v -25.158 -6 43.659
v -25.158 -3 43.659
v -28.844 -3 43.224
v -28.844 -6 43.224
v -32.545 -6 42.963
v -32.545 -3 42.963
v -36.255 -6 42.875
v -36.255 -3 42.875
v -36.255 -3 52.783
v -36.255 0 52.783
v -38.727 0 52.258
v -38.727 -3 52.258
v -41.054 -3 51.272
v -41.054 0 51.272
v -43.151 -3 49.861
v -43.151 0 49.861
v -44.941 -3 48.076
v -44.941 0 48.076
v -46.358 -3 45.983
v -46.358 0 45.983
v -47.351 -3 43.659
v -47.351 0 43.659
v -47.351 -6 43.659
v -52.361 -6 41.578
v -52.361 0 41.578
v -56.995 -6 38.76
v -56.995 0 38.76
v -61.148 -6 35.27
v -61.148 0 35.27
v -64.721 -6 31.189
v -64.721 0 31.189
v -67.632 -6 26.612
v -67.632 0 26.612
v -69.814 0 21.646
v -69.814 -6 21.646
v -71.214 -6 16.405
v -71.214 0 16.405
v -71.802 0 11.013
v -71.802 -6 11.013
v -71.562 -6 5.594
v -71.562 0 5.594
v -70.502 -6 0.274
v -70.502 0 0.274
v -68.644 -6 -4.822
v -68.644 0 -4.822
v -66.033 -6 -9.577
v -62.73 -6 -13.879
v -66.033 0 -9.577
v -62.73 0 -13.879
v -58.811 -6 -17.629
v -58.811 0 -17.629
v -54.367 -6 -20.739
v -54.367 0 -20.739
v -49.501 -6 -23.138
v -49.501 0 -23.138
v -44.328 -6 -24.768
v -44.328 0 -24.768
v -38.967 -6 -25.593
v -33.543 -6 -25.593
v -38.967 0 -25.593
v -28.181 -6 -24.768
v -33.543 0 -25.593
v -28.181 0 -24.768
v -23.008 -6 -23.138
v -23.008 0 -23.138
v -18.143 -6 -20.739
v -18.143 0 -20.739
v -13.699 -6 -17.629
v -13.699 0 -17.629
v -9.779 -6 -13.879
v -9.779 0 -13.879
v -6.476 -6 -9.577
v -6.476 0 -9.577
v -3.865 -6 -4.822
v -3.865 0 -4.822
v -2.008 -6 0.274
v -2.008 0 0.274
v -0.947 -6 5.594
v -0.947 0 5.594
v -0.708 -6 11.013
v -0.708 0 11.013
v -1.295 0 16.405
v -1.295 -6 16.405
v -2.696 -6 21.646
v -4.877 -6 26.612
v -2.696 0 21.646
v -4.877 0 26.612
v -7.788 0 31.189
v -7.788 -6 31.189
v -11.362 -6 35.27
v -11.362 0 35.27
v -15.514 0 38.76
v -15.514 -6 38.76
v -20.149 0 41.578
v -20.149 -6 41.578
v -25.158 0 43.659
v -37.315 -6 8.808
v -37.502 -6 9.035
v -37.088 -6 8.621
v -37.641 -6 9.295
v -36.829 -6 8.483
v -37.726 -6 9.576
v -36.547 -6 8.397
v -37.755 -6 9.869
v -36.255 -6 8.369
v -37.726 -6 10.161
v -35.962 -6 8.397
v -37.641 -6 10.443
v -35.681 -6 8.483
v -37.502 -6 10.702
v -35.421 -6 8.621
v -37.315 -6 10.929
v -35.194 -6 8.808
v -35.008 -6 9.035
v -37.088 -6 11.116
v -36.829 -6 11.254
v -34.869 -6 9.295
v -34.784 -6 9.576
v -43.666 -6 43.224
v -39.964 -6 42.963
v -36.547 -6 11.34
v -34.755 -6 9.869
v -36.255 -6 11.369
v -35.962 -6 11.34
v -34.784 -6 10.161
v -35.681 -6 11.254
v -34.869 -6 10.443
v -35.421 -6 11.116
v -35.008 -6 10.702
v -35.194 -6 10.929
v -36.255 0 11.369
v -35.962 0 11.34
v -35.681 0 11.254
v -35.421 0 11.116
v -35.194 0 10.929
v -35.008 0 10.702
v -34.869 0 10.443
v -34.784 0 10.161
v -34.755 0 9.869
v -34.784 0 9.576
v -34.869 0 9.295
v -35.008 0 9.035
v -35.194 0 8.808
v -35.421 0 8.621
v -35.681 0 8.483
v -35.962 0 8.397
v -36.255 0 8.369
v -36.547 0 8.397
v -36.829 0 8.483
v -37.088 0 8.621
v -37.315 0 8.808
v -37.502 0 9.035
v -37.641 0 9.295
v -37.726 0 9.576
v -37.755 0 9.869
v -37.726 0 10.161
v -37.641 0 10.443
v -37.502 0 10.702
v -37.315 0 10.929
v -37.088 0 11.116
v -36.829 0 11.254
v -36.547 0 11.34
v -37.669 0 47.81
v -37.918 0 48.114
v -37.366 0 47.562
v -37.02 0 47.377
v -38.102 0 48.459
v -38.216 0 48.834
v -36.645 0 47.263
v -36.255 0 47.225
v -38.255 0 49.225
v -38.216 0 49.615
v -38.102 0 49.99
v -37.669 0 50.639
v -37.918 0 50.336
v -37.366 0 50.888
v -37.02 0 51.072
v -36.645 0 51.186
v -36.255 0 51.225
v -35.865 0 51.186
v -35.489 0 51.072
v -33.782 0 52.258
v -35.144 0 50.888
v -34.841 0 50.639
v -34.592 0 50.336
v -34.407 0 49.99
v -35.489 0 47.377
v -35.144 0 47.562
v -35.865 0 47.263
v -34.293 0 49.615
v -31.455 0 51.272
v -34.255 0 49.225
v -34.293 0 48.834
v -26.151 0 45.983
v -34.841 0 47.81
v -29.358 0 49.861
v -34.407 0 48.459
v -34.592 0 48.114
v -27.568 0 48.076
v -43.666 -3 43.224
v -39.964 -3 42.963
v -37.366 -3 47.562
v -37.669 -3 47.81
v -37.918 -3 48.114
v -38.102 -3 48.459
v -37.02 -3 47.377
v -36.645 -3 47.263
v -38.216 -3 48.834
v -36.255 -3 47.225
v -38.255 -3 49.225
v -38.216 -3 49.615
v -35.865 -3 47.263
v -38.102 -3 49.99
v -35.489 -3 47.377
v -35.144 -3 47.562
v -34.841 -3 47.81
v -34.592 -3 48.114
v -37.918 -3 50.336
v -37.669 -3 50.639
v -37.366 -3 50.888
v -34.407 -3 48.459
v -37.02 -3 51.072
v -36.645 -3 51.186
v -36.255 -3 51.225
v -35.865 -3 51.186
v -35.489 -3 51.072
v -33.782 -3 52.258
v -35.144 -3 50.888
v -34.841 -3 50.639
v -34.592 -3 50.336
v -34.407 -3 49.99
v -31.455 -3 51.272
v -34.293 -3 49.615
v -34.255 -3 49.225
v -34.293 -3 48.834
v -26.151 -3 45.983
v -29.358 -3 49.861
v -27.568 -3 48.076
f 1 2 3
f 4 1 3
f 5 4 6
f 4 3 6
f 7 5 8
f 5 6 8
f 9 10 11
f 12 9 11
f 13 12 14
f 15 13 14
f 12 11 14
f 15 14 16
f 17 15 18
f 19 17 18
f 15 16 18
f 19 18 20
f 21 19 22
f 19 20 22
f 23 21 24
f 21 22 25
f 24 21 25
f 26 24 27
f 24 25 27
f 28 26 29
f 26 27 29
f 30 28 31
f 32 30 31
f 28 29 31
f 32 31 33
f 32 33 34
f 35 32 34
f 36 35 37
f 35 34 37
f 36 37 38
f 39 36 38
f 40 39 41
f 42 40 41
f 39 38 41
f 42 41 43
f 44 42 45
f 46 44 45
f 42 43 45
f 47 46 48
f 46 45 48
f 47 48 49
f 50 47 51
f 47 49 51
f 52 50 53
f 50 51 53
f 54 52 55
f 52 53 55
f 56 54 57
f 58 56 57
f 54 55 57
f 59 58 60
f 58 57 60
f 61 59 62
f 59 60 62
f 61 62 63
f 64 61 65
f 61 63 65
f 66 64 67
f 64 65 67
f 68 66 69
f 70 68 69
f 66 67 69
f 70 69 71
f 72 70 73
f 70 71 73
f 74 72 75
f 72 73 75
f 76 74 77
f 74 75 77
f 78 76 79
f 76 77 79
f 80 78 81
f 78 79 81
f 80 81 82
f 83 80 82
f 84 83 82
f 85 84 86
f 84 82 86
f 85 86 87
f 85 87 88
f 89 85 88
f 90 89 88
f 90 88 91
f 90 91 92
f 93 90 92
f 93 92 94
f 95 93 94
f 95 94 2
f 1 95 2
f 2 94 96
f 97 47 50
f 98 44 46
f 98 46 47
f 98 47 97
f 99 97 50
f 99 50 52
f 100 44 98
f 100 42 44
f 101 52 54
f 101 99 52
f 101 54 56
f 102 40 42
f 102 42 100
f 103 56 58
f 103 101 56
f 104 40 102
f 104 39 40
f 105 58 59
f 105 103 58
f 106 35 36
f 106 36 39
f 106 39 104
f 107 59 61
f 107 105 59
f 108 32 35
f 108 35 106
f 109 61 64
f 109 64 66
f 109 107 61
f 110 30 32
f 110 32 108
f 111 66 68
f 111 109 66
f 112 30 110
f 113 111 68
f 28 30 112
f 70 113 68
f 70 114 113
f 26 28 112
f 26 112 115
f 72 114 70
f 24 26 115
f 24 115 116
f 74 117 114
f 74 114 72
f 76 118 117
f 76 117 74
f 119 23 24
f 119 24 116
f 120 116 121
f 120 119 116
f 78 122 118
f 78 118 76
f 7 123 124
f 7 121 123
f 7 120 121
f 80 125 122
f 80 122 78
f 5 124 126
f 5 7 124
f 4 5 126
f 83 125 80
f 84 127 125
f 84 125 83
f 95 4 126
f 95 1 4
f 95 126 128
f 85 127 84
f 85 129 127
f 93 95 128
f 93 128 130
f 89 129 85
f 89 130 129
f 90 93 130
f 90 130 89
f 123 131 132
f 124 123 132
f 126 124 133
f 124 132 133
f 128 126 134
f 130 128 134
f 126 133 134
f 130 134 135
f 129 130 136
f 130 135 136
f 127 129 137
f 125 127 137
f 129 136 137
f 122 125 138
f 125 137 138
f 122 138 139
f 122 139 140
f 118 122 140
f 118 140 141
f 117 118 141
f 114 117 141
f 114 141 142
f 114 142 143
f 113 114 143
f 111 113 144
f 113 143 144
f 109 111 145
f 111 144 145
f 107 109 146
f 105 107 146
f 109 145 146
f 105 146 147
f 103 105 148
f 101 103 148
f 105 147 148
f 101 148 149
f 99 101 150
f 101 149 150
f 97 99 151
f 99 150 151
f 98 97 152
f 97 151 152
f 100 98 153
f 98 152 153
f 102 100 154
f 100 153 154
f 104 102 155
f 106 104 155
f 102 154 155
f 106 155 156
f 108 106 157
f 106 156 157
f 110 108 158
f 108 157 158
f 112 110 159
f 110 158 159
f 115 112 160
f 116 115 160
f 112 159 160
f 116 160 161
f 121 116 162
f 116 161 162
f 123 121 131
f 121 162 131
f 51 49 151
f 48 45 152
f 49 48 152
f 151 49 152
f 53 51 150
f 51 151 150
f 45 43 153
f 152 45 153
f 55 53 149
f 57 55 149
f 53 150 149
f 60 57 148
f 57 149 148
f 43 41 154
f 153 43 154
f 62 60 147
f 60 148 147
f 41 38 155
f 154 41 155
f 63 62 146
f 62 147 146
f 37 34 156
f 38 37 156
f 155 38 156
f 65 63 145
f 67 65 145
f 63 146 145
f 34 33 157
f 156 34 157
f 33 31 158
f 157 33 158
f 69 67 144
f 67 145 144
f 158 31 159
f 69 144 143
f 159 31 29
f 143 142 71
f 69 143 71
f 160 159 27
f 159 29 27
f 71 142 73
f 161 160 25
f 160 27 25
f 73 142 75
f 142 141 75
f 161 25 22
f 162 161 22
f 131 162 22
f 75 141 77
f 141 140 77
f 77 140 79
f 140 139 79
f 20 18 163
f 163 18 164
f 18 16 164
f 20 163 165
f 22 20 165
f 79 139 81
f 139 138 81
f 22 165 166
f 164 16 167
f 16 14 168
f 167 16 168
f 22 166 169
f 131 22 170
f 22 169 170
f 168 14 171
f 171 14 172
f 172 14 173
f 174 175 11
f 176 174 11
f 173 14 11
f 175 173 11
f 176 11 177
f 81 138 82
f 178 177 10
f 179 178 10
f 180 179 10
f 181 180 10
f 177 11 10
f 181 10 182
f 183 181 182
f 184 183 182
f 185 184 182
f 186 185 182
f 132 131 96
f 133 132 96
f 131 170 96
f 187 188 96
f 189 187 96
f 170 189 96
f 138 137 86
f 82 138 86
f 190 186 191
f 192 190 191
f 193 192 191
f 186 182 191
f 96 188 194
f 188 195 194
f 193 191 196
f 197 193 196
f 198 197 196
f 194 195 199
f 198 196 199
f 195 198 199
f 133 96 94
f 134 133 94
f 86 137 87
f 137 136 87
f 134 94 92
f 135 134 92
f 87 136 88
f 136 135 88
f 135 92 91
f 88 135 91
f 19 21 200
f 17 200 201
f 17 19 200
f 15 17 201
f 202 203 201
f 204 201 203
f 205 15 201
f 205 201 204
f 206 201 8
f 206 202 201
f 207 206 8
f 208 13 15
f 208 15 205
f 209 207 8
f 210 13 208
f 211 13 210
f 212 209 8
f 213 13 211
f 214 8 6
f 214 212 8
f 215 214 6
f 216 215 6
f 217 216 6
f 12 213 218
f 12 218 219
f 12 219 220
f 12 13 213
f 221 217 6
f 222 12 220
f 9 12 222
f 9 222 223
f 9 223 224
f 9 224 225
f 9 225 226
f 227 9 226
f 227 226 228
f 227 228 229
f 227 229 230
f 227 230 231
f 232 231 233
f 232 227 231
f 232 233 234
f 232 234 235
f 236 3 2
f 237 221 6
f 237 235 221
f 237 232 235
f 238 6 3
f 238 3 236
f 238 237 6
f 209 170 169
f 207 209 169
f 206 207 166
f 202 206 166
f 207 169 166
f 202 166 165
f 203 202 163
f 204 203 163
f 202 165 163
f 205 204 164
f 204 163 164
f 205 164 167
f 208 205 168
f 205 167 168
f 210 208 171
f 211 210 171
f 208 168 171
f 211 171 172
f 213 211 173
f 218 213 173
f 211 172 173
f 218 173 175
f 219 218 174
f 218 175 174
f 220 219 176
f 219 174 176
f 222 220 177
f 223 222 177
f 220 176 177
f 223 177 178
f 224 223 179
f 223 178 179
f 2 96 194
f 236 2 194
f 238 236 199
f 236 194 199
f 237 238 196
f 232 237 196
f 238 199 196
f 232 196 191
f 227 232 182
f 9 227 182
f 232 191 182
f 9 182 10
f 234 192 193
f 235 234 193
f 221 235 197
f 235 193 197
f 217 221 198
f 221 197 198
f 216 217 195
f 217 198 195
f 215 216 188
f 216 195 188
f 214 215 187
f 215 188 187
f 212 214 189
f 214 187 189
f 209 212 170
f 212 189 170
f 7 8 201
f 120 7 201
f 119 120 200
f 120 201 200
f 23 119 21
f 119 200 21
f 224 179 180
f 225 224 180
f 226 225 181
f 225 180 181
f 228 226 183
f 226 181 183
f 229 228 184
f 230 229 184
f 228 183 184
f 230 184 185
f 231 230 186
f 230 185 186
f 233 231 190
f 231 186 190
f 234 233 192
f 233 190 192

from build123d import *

# Parameters (mm, degrees)
F1_DEPTH = 3
F2_DEPTH = 6


# Not quite as in the source:
# - the program builds the solid bodies; features that only make, move or delete a surface that nothing else refers to are left out


with BuildPart() as f1:
    # F0 (on Front) → F1 (new body)
    with BuildSketch(Plane.XZ):
        with BuildLine():
            ThreePointArc((-36.2547188994, 42.8754752639), (-41.8166946482, 43.071513271), (-47.3510663807, 43.6586543583))
            ThreePointArc((-47.3510663807, 43.6586543583), (-36.2547188994, -25.6966625147), (-25.1583714182, 43.6586543583))
            ThreePointArc((-25.1583714182, 43.6586543583), (-30.6927431507, 43.071513271), (-36.2547188994, 42.8754752639))
        make_face()
        with BuildLine():
            ThreePointArc((-34.7547188994, 9.8686634646), (-37.3153790712, 8.8080032929), (-36.2547188994, 11.3686634646))
            ThreePointArc((-36.2547188994, 11.3686634646), (-35.1940587277, 10.9293236364), (-34.7547188994, 9.8686634646))
        make_face(mode=Mode.SUBTRACT)
        with BuildLine():
            ThreePointArc((-36.2547188994, 52.7826075633), (-43.1513282612, 49.8605681538), (-47.3510663807, 43.6586543583))
            ThreePointArc((-47.3510663807, 43.6586543583), (-41.8166946482, 43.071513271), (-36.2547188994, 42.8754752639))
            Line((-36.2547188994, 42.8754752639), (-36.2547188994, 47.2246634646))
            ThreePointArc((-36.2547188994, 47.2246634646), (-38.2547188994, 49.2246634646), (-36.2547188994, 51.2246634646))
            Line((-36.2547188994, 51.2246634646), (-36.2547188994, 52.7826075633))
        make_face()
        with BuildLine():
            ThreePointArc((-36.2547188994, 42.8754752639), (-30.6927431507, 43.071513271), (-25.1583714182, 43.6586543583))
            ThreePointArc((-25.1583714182, 43.6586543583), (-29.3581095377, 49.8605681538), (-36.2547188994, 52.7826075633))
            Line((-36.2547188994, 52.7826075633), (-36.2547188994, 51.2246634646))
            ThreePointArc((-36.2547188994, 51.2246634646), (-34.8405053371, 50.638877027), (-34.2547188994, 49.2246634646))
            ThreePointArc((-34.2547188994, 49.2246634646), (-34.8405053371, 47.8104499023), (-36.2547188994, 47.2246634646))
            Line((-36.2547188994, 47.2246634646), (-36.2547188994, 42.8754752639))
        make_face()
    extrude(amount=F1_DEPTH)

    # F0 (on Front) → F2 (join)
    with BuildSketch(Plane.XZ):
        with BuildLine():
            ThreePointArc((-36.2547188994, 42.8754752639), (-41.8166946482, 43.071513271), (-47.3510663807, 43.6586543583))
            ThreePointArc((-47.3510663807, 43.6586543583), (-36.2547188994, -25.6966625147), (-25.1583714182, 43.6586543583))
            ThreePointArc((-25.1583714182, 43.6586543583), (-30.6927431507, 43.071513271), (-36.2547188994, 42.8754752639))
        make_face()
        with BuildLine():
            ThreePointArc((-34.7547188994, 9.8686634646), (-37.3153790712, 8.8080032929), (-36.2547188994, 11.3686634646))
            ThreePointArc((-36.2547188994, 11.3686634646), (-35.1940587277, 10.9293236364), (-34.7547188994, 9.8686634646))
        make_face(mode=Mode.SUBTRACT)
    extrude(amount=F2_DEPTH)


solid = f1.part
